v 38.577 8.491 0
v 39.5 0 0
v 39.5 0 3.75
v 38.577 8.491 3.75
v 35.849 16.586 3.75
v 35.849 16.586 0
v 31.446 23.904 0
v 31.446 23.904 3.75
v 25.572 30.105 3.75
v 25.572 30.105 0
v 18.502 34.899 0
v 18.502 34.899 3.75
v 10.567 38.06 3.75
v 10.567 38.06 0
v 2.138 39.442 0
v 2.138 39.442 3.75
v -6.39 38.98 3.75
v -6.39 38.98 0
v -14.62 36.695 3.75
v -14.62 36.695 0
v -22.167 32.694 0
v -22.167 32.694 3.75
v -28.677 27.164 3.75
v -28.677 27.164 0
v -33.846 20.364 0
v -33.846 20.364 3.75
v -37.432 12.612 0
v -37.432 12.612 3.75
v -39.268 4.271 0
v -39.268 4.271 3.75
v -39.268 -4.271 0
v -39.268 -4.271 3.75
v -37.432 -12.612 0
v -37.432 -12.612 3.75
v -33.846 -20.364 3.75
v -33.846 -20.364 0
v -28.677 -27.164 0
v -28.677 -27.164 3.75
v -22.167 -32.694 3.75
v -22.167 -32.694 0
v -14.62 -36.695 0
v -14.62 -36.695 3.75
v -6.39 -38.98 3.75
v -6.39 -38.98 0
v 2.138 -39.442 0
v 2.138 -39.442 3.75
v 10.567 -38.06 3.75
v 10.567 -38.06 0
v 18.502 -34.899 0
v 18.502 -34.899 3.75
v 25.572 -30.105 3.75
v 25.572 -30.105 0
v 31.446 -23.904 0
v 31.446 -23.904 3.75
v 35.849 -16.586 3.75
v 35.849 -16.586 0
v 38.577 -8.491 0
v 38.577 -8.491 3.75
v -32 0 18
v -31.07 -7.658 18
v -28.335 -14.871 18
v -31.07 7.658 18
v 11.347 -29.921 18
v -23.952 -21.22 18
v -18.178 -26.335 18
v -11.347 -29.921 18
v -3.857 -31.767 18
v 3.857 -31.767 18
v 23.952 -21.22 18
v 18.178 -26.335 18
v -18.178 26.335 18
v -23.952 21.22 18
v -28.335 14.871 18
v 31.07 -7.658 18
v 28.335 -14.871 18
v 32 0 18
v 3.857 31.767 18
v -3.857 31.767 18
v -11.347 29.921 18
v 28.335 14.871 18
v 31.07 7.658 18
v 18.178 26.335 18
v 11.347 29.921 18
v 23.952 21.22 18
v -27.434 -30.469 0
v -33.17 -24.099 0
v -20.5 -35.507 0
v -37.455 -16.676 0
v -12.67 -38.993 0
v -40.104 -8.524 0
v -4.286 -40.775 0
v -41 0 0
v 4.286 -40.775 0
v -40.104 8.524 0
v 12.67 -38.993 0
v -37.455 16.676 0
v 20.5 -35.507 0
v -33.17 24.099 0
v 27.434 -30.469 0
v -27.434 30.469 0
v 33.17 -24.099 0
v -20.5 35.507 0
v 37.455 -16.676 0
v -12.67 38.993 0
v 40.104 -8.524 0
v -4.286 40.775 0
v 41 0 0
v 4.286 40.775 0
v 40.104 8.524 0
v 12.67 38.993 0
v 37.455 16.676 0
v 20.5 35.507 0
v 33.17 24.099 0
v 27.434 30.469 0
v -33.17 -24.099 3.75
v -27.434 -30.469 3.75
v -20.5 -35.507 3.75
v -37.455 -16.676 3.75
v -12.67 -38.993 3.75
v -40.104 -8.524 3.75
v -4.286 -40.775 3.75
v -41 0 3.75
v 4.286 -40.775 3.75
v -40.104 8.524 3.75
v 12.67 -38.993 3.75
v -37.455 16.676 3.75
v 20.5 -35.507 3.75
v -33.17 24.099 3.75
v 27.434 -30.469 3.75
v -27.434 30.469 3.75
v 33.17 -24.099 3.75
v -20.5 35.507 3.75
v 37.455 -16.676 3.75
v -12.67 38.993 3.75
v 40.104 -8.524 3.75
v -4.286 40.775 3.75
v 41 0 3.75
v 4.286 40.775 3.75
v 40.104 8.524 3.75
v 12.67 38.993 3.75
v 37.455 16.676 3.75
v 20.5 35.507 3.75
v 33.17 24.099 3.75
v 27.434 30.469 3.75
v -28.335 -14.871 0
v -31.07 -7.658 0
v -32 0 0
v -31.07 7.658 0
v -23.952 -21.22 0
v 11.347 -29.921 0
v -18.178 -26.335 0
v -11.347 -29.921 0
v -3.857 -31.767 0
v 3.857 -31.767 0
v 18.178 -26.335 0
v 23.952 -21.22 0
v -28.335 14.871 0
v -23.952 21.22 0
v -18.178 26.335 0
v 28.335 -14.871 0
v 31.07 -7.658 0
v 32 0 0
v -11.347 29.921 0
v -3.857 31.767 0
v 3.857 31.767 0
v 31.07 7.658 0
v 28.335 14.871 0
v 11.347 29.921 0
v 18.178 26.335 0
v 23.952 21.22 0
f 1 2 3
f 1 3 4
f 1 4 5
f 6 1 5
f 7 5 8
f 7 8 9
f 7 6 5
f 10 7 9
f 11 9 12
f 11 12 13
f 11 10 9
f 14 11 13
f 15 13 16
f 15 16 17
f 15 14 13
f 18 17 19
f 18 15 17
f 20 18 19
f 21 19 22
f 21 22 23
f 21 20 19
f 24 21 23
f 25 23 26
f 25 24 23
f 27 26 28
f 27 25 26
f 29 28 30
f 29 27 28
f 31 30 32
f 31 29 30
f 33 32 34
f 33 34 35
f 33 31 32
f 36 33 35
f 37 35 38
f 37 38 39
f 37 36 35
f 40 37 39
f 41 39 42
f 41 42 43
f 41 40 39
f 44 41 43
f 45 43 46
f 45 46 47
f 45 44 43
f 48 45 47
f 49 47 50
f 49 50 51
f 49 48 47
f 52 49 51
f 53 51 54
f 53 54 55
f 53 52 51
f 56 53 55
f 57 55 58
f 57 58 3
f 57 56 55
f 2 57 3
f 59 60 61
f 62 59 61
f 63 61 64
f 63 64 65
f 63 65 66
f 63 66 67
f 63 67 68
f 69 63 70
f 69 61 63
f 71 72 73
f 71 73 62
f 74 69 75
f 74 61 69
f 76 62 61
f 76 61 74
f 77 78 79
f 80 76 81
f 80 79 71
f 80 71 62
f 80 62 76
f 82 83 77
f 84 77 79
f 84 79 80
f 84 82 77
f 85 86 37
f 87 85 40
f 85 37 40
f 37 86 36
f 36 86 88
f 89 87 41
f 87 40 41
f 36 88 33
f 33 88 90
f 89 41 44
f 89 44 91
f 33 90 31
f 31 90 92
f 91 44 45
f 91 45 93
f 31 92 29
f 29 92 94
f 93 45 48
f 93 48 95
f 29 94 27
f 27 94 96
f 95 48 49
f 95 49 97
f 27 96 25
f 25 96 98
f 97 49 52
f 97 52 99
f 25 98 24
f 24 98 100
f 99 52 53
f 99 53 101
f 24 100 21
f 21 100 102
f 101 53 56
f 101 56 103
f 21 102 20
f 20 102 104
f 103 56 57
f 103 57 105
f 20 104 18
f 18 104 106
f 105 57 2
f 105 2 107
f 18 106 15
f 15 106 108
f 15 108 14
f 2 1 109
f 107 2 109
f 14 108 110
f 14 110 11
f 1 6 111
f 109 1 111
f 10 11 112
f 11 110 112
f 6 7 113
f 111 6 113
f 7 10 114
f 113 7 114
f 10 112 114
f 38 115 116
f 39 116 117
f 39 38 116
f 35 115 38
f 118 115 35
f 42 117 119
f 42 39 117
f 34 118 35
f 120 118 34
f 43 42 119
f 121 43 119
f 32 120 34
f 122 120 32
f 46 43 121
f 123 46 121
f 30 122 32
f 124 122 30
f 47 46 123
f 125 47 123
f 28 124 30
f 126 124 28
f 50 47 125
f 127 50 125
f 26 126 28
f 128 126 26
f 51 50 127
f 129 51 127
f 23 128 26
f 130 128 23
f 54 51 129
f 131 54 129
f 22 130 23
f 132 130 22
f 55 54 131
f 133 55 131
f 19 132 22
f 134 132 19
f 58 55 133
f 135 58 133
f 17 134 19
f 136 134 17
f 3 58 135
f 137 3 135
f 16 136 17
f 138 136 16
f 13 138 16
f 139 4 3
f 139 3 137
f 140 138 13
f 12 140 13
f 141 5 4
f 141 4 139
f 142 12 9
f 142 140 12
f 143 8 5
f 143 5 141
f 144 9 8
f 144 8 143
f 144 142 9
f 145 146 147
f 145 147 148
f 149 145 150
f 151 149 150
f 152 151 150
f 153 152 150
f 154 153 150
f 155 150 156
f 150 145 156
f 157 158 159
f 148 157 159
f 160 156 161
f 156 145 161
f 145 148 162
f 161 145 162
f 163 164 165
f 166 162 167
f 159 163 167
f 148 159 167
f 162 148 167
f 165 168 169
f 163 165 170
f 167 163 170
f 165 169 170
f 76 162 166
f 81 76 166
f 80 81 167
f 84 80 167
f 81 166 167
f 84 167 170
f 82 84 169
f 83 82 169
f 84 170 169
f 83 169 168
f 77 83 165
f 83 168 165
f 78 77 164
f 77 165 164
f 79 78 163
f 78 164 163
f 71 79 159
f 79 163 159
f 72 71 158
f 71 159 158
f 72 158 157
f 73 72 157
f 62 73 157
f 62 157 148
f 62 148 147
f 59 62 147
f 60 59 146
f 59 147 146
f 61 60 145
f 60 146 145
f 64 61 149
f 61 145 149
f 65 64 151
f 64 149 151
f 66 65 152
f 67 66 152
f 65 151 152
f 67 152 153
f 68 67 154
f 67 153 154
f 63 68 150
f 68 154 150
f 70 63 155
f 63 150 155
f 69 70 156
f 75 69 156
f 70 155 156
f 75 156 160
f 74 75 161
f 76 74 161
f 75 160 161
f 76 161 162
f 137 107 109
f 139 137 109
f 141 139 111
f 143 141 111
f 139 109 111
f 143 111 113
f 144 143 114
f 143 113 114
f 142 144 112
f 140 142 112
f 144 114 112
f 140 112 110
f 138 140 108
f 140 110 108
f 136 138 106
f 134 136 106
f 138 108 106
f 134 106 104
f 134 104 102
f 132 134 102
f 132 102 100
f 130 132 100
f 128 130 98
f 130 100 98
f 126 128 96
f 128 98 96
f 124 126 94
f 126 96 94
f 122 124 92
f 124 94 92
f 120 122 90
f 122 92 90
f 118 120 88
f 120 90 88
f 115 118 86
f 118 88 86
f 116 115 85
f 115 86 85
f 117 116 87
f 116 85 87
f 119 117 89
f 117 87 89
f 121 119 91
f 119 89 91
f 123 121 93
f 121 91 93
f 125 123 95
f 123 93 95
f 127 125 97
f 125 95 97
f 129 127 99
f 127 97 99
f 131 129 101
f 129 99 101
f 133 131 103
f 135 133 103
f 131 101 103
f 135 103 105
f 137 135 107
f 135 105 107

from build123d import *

# Parameters (mm, degrees)
F0_R     = 41
F0_R_2   = 39.5
F1_DEPTH = 3.75
F2_R     = 32
F3_DEPTH = 18


with BuildPart() as f1:
    # F0 (on Top) → F1 (new body)
    with BuildSketch(Plane.XY):
        Circle(F0_R)
        Circle(F0_R_2, mode=Mode.SUBTRACT)
    extrude(amount=F1_DEPTH)


with BuildPart() as f3:
    # F2 (on Top) → F3 (new body)
    with BuildSketch(Plane.XY):
        Circle(F2_R)
    extrude(amount=F3_DEPTH)


solid = Compound([f1.part, f3.part])
